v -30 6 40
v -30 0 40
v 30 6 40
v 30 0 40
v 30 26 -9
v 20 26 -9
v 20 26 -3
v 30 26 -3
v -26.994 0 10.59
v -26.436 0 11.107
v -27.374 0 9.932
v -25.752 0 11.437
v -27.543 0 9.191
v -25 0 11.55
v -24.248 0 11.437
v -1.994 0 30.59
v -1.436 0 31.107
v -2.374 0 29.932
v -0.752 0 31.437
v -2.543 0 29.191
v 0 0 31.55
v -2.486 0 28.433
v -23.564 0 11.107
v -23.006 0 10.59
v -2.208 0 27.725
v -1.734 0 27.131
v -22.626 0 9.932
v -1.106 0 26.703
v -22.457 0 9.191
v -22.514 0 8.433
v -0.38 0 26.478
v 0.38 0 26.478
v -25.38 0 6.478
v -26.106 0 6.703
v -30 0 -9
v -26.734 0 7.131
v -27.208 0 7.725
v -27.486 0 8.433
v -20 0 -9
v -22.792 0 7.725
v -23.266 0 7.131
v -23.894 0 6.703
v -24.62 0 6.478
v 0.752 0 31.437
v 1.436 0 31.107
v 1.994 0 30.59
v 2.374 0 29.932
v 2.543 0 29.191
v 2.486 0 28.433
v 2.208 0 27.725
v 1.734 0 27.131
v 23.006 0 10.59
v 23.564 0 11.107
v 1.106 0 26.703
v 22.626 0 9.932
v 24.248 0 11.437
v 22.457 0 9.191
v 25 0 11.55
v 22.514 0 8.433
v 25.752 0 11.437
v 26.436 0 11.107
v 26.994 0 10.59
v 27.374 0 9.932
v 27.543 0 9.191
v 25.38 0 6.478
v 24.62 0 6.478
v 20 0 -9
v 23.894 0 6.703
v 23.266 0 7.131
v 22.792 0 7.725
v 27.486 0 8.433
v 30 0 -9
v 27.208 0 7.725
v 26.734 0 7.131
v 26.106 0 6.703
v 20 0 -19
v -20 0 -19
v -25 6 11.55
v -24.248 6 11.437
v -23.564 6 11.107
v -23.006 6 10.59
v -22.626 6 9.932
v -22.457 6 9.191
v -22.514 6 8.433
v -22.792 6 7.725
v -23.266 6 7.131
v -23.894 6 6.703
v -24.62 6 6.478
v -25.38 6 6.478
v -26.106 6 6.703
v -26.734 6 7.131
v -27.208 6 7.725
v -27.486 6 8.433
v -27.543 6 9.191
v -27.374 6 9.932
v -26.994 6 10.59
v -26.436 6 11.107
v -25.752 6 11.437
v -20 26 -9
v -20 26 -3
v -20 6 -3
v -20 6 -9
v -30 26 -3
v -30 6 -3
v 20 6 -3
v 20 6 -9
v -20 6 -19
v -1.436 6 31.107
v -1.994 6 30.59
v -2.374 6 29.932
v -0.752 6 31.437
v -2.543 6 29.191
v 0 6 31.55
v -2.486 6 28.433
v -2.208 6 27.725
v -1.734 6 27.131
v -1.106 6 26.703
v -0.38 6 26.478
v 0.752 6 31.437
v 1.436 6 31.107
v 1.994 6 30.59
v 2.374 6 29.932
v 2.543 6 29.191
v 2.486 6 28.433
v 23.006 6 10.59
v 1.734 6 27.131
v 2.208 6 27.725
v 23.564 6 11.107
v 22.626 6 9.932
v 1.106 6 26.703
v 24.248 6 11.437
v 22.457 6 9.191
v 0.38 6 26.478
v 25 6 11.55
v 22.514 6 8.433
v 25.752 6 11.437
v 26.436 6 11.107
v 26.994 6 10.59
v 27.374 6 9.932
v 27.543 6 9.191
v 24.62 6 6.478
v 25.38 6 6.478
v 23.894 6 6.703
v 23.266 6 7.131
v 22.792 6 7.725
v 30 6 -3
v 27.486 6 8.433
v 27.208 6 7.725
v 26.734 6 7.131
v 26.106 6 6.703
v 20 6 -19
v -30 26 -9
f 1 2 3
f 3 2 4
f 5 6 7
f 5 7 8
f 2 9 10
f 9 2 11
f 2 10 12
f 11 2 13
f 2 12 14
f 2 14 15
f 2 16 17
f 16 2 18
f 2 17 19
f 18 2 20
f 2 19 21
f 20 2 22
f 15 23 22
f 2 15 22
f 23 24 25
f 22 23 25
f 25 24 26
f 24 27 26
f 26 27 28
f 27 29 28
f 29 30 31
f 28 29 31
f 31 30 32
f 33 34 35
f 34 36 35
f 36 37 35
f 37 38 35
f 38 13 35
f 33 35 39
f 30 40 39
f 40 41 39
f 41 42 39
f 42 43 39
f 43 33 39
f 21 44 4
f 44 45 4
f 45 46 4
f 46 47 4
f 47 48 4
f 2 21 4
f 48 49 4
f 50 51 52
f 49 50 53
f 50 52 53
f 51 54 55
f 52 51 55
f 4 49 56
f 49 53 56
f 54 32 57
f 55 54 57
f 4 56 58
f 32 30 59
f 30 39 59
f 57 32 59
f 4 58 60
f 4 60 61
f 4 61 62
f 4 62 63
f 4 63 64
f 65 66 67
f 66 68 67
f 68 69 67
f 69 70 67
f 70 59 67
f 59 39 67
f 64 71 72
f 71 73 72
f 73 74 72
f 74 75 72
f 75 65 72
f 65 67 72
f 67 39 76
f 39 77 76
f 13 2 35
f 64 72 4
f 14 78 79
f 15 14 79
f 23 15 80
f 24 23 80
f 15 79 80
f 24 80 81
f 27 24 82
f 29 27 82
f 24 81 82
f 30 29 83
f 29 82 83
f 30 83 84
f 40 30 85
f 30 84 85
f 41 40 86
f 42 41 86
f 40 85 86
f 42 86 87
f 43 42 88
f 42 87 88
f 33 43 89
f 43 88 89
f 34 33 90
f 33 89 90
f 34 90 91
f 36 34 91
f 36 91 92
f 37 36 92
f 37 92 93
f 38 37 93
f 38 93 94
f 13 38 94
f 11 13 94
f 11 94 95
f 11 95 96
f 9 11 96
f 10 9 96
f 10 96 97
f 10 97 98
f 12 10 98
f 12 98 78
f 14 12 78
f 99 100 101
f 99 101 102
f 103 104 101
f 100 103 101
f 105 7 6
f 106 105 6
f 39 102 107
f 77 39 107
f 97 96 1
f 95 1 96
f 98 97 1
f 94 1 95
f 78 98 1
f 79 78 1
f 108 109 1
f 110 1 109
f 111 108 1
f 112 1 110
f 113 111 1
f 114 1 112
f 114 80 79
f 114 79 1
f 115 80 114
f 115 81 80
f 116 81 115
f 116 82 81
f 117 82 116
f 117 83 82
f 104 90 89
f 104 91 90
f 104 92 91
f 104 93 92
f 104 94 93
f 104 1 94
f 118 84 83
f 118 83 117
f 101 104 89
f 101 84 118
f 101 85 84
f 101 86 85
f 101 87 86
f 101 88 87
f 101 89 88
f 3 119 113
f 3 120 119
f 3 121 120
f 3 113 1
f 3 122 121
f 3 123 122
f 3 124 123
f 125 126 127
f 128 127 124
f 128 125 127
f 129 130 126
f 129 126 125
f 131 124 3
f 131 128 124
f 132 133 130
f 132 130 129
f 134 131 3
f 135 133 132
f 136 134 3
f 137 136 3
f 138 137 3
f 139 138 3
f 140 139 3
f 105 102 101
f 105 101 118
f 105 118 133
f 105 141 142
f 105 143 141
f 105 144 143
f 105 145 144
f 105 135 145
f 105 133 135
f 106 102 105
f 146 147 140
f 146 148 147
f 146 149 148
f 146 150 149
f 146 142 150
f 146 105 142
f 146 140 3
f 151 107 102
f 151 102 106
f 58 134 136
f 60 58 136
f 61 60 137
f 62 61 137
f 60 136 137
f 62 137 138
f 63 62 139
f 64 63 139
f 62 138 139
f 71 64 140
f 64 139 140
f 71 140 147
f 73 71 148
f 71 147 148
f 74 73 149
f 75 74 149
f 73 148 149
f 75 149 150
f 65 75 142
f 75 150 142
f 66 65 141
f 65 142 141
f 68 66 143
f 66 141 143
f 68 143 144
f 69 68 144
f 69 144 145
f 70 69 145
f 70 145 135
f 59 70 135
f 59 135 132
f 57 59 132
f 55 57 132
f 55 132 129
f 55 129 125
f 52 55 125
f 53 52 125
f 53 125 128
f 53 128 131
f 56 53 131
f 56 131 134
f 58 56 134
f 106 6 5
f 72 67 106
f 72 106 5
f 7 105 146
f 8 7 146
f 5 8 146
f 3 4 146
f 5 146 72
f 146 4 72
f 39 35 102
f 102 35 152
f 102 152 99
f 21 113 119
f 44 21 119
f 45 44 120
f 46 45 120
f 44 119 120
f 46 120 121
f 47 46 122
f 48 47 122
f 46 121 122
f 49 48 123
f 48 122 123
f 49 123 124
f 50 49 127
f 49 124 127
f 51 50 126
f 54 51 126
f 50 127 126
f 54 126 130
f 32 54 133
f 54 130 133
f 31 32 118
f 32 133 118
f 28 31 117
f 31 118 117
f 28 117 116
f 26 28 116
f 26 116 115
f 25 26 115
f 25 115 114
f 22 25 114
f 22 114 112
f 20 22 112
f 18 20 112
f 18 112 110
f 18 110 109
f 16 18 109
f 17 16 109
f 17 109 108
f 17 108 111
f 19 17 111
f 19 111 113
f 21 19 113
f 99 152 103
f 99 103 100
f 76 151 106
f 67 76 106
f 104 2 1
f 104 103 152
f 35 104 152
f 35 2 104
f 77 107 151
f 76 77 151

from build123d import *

# Parameters (mm, degrees)
SKETCH1_W           = 60
SKETCH1_H           = 80
BOSS_EXTRUDE1_DEPTH = 6
SKETCH2_R           = 2.55
CUT_EXTRUDE1_DEPTH  = 51.358713248
SKETCH3_W           = 10
SKETCH3_H           = 6
BOSS_EXTRUDE2_DEPTH = 20


with BuildPart() as part:
    # Sketch1 → Boss-Extrude1 (new body)
    with BuildSketch(Plane(origin=(0, 0, 0), x_dir=(1, 0, 0), z_dir=(0, 1, 0))):
        Rectangle(SKETCH1_W, SKETCH1_H)
    extrude(amount=BOSS_EXTRUDE1_DEPTH)

    # Sketch2 → Cut-Extrude1 (cut, through all)
    with BuildSketch(Plane(origin=(0, 6, 0), x_dir=(1, 0, 0), z_dir=(0, 1, 0))):
        with Locations(Location((25, -9, 0), (0, 0, 270))):
            Circle(SKETCH2_R)
        with Locations(Location((-25, -9, 0), (0, 0, 270))):
            Circle(SKETCH2_R)
        with Locations(Location((0, -29, 0), (0, 0, 270))):
            Circle(SKETCH2_R)
        Polygon((-38.891606185, 9), (-20, 9), (-20, 19), (20, 19), (20, 9), (37.945141675, 9), (37.945141675, 57.336722716), (-38.891606185, 57.336722716), align=None)
    extrude(amount=-CUT_EXTRUDE1_DEPTH, mode=Mode.SUBTRACT)

    # Sketch3 → Boss-Extrude2 (add)
    with BuildSketch(Plane(origin=(0, 6, 0), x_dir=(1, 0, 0), z_dir=(0, 1, 0))):
        with Locations((25, 6)):
            Rectangle(SKETCH3_W, SKETCH3_H)
        with Locations((-25, 6)):
            Rectangle(SKETCH3_W, SKETCH3_H)
    extrude(amount=BOSS_EXTRUDE2_DEPTH)


solid = part.part
